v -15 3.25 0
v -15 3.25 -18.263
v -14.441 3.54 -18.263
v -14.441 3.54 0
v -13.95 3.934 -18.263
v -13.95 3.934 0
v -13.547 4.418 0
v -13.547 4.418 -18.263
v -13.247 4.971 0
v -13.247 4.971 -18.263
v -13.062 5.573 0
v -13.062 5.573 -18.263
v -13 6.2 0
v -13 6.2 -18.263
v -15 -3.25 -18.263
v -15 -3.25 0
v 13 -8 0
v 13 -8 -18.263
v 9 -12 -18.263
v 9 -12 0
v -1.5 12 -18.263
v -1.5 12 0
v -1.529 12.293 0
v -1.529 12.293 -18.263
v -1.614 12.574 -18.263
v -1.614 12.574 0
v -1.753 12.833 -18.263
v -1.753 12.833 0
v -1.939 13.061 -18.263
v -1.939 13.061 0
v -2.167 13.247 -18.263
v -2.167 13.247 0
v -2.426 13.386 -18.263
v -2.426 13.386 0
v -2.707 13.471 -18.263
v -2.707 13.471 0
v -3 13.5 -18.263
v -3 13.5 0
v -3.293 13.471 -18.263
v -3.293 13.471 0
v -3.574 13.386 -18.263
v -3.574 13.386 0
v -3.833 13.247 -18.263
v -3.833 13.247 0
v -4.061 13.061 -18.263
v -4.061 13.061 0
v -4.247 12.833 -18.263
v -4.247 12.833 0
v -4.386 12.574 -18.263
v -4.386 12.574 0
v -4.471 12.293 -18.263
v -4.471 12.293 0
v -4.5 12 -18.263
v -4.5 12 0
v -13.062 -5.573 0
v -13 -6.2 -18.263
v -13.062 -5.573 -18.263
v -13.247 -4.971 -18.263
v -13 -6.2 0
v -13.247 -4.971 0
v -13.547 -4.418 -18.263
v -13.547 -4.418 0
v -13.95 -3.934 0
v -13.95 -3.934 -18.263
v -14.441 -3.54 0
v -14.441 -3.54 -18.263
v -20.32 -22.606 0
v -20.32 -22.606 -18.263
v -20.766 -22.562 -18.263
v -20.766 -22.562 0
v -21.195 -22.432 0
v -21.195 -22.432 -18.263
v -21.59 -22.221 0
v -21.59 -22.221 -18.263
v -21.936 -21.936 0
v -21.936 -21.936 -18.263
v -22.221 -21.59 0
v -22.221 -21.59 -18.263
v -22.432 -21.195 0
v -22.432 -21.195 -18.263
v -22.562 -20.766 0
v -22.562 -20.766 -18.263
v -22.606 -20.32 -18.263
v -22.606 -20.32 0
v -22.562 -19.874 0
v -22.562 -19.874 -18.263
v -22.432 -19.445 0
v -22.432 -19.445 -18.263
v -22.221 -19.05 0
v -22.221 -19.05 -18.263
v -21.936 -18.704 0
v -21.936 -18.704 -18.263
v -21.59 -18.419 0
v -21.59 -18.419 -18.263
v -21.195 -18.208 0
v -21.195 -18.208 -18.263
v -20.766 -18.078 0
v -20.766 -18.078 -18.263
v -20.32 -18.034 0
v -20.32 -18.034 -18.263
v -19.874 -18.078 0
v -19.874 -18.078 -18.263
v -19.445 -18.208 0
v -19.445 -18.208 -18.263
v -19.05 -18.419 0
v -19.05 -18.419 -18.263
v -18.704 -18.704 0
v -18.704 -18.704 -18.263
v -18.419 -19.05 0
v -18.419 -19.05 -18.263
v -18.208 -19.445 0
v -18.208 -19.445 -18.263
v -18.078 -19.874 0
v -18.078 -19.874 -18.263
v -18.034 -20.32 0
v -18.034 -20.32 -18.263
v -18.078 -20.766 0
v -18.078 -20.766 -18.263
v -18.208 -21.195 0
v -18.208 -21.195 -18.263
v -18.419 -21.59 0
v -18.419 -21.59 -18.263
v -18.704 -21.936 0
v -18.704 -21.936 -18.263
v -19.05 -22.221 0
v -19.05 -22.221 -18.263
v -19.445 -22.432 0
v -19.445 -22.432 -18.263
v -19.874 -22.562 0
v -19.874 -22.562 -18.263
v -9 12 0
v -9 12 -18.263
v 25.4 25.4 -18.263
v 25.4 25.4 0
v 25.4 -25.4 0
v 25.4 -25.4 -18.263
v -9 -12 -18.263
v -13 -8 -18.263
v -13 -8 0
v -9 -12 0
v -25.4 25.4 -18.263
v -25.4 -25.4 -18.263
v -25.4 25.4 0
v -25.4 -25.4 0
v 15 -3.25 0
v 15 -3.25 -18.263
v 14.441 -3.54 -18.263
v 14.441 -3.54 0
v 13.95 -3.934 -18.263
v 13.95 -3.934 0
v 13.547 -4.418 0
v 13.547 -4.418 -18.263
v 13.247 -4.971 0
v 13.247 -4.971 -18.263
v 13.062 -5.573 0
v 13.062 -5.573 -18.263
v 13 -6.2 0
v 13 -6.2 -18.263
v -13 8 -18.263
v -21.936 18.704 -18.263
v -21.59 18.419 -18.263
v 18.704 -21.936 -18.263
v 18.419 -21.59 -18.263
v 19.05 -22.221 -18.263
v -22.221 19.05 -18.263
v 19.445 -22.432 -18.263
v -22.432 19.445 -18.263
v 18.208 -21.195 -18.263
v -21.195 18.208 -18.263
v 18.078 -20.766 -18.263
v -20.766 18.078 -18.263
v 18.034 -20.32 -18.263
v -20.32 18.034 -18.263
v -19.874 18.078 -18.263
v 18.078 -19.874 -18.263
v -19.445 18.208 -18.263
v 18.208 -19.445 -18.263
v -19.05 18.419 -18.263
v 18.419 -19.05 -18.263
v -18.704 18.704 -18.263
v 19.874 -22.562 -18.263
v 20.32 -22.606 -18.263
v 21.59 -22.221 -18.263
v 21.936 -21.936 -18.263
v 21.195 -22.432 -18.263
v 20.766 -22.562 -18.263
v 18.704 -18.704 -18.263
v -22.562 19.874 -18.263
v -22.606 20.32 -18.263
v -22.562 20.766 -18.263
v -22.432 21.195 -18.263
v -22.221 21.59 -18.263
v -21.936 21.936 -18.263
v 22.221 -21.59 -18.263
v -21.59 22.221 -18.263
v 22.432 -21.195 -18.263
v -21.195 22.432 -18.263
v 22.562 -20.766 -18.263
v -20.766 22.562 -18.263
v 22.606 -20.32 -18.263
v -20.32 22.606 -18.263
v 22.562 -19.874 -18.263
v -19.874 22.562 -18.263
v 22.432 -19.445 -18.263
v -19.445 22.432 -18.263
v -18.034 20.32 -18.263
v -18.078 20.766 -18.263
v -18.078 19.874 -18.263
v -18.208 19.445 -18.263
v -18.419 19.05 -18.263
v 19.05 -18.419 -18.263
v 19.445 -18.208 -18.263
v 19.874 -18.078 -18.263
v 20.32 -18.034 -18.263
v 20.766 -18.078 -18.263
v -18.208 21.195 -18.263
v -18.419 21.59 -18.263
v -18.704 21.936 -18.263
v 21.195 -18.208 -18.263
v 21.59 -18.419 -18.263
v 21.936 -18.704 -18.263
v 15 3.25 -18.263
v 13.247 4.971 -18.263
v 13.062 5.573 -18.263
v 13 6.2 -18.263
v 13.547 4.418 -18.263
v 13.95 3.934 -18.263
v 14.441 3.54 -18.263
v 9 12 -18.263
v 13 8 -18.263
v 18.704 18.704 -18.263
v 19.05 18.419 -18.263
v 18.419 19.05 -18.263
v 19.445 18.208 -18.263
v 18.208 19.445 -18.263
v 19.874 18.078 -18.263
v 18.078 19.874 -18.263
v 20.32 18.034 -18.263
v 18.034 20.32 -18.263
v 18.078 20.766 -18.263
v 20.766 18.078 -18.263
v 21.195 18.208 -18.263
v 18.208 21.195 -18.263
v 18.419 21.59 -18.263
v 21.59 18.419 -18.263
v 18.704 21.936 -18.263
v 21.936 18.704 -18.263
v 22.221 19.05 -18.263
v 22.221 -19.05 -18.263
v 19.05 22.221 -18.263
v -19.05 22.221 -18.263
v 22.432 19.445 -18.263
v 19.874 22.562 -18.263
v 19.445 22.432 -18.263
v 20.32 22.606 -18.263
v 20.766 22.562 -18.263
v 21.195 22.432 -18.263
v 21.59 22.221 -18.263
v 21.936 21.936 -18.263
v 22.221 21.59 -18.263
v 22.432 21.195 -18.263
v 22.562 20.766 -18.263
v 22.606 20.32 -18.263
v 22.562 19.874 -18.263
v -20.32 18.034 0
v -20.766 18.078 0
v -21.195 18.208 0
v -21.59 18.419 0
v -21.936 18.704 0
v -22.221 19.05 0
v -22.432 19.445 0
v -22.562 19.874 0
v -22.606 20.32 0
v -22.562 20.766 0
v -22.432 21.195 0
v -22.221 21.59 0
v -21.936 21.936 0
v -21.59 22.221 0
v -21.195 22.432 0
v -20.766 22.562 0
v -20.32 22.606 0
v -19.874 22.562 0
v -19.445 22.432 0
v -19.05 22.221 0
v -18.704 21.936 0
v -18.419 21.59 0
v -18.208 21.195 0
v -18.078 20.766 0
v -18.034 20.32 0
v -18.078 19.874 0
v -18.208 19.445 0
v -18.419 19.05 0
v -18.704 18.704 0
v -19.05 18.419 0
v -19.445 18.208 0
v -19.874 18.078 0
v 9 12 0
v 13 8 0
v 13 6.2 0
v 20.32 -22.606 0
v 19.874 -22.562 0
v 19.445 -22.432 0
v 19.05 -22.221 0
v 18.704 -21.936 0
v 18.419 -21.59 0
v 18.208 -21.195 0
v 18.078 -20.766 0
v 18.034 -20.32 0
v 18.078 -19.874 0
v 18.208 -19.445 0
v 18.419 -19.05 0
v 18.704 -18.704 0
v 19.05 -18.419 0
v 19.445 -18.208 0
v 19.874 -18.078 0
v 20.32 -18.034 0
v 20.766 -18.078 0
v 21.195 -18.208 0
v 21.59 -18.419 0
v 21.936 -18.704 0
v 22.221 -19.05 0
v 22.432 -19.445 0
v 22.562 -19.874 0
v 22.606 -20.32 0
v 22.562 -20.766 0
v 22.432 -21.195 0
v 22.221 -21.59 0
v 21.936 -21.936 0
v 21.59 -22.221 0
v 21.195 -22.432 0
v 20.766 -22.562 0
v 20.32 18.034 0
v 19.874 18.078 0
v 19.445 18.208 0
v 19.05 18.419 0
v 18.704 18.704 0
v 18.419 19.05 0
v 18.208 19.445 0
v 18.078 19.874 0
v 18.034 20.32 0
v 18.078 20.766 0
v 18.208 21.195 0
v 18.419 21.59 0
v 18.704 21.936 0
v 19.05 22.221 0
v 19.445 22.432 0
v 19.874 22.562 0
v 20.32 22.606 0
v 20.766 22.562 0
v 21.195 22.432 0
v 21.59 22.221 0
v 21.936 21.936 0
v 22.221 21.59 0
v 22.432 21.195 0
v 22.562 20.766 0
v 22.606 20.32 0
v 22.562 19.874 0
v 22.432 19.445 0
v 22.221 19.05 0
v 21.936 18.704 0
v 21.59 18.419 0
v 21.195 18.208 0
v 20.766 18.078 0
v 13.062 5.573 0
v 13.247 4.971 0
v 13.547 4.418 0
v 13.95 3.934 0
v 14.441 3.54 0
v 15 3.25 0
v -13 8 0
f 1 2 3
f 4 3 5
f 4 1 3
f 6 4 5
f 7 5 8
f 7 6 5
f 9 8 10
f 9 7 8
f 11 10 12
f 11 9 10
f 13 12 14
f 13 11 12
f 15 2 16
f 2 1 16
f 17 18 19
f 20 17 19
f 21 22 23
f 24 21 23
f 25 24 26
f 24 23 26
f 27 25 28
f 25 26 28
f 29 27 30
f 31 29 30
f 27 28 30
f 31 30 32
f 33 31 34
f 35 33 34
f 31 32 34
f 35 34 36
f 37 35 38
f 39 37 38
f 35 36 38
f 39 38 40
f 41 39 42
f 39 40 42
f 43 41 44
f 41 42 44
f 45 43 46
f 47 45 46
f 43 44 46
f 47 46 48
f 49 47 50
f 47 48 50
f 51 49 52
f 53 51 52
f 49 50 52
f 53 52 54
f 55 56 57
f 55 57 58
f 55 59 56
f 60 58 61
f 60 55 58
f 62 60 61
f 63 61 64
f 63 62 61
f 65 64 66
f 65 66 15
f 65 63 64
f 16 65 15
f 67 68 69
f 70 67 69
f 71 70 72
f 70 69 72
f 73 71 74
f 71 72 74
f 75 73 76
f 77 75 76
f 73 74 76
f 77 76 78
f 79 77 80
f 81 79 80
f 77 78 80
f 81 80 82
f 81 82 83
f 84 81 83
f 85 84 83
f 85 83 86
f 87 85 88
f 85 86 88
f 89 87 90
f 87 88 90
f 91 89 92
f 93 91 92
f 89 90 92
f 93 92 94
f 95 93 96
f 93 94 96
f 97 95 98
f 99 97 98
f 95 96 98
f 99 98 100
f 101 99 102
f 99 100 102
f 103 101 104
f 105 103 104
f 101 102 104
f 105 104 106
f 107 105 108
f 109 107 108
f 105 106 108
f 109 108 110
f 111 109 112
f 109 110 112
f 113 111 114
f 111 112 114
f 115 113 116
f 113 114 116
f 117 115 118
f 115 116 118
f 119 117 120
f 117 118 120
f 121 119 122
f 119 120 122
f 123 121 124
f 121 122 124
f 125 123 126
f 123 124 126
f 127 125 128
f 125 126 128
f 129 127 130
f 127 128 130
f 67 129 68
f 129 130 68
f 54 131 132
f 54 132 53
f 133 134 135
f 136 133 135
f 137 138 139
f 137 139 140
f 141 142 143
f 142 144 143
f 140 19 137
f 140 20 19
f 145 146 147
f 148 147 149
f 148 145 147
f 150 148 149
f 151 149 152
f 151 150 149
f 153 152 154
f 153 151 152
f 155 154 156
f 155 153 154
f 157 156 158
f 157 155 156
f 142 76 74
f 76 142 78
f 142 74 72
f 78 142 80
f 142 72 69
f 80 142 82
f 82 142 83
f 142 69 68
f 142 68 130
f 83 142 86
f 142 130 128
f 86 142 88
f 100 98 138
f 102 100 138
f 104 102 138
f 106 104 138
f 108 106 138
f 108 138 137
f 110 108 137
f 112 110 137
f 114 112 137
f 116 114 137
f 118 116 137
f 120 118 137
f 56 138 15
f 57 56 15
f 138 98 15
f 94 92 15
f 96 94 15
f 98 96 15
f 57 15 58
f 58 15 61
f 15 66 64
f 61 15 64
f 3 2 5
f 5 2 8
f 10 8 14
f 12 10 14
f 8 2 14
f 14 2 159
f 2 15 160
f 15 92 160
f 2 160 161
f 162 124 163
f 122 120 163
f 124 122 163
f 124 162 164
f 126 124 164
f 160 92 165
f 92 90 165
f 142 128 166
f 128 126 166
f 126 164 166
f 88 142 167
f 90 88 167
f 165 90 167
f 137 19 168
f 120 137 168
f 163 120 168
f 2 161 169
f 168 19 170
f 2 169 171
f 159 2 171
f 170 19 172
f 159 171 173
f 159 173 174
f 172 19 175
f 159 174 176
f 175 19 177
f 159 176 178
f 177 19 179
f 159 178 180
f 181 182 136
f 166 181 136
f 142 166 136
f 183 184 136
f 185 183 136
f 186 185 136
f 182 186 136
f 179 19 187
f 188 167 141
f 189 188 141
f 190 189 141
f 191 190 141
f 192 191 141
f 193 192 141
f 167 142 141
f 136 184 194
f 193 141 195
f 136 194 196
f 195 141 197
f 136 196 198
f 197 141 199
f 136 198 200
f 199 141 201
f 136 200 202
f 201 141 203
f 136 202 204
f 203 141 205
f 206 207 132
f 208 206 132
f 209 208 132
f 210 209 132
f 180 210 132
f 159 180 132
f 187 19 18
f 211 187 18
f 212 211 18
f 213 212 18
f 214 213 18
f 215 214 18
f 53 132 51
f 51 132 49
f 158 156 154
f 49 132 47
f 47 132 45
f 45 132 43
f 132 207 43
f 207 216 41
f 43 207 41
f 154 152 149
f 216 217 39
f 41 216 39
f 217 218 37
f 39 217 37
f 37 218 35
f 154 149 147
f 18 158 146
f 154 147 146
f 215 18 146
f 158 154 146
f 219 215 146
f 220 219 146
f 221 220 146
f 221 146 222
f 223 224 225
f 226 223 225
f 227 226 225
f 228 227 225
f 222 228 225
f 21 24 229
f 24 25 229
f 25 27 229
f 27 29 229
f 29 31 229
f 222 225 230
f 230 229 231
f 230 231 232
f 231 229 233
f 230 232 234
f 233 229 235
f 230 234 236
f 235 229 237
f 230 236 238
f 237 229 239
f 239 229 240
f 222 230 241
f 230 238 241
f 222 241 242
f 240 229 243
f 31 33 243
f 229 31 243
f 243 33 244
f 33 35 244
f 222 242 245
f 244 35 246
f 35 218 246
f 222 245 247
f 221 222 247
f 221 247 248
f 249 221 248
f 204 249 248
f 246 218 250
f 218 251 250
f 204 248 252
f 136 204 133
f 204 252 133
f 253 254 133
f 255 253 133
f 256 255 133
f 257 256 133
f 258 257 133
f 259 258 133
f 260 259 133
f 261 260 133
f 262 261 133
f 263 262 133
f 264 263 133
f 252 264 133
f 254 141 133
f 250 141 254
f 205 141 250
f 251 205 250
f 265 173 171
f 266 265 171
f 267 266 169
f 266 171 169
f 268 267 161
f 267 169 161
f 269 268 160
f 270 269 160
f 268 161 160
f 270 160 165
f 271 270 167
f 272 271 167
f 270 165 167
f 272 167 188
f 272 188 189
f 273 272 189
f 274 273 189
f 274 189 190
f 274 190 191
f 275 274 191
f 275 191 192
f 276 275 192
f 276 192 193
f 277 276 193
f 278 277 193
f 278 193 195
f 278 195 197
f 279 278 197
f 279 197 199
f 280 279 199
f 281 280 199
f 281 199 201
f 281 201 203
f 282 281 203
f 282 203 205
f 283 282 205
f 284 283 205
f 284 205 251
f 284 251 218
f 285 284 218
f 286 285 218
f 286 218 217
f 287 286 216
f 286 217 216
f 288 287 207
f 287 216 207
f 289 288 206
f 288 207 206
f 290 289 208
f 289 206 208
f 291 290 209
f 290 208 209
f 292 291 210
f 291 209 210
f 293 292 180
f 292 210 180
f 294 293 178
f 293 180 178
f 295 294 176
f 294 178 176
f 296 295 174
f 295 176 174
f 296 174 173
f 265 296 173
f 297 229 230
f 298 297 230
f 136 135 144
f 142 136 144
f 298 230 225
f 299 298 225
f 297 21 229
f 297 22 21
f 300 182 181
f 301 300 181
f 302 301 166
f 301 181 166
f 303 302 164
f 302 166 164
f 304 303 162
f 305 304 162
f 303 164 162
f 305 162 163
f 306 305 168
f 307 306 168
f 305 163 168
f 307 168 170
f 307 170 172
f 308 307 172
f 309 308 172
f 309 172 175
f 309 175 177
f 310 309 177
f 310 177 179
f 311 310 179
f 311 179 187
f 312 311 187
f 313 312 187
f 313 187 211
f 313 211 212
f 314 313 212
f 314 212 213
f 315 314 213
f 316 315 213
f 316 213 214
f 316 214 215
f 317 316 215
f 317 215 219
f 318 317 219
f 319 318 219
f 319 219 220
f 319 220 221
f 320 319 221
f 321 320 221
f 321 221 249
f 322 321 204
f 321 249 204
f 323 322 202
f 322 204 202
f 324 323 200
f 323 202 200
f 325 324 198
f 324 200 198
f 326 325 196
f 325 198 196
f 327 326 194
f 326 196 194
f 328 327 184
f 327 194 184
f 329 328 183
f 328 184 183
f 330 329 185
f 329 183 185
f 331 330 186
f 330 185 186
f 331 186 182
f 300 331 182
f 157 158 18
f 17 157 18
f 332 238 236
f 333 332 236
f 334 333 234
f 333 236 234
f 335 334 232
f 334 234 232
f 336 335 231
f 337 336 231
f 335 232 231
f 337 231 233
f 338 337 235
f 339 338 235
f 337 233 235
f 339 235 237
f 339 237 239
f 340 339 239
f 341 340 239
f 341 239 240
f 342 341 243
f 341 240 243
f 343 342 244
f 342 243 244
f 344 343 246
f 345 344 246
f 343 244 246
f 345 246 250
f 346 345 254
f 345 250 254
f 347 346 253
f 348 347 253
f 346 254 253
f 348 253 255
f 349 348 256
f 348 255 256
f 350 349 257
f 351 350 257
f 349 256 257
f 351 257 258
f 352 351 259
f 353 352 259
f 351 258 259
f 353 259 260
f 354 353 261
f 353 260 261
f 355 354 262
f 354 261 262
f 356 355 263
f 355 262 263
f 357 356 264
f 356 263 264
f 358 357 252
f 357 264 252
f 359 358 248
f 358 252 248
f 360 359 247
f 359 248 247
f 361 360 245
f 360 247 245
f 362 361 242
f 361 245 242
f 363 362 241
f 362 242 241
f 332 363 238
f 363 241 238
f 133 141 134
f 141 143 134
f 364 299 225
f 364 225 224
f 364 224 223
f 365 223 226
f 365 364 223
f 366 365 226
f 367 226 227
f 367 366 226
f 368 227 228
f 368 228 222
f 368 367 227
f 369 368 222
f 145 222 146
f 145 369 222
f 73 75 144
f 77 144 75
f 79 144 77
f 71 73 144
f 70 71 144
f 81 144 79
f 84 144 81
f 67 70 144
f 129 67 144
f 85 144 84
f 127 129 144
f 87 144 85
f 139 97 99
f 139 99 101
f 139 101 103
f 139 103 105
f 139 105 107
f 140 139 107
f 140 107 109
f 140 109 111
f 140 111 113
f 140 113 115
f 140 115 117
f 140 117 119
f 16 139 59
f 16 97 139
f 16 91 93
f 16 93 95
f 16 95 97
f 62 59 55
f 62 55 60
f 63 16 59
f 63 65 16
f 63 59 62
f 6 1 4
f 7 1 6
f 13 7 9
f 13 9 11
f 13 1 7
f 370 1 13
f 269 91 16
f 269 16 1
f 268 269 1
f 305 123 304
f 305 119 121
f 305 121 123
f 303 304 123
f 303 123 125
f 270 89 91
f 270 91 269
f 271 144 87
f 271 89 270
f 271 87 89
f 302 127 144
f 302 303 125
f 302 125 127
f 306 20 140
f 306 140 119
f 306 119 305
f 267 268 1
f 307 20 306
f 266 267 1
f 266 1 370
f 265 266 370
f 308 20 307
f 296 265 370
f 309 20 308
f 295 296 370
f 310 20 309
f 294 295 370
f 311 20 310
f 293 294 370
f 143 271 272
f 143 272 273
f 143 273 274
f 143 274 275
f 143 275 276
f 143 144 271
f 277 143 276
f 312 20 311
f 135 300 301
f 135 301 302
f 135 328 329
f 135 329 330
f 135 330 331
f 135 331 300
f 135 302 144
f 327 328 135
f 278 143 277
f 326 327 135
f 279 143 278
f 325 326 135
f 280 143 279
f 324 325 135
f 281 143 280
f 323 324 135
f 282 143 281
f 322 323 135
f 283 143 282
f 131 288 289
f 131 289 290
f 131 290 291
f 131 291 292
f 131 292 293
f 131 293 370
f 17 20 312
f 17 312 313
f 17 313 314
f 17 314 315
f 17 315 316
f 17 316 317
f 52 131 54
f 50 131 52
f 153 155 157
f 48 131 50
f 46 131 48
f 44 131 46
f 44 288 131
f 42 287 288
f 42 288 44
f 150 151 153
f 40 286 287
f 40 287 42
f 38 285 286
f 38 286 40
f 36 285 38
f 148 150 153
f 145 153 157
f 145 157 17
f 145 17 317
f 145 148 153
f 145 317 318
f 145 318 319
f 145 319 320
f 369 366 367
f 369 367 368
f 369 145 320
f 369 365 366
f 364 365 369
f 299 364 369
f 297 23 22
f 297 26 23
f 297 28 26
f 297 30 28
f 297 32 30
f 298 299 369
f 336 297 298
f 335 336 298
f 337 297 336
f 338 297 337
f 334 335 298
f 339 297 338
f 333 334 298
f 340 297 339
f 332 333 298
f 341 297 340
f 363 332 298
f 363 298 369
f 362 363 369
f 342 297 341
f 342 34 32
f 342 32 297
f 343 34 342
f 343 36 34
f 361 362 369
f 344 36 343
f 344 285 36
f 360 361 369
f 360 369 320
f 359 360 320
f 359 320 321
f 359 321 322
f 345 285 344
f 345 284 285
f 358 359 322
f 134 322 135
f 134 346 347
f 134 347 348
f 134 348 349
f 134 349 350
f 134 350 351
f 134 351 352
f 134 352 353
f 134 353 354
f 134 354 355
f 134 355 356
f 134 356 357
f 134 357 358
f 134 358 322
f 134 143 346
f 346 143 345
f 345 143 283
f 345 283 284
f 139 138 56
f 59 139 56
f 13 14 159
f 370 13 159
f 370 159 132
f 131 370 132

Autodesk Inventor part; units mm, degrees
ref_plane "YZ Plane" through (0, 0, 0) normal (1, 0, 0) x (0, 1, 0)
ref_plane "XZ Plane" through (0, 0, 0) normal (0, 1, 0) x (-1, 0, 0)
ref_plane "XY Plane" through (0, 0, 0) normal (0, 0, 1) x (1, 0, 0)
sketch "Sketch1" plane through (0, 0, 0) normal (0, 0, 1) x (1, 0, 0)
  line L0 (-13, 12) -> (13, 12)
  line L1 (13, 12) -> (13, -12)
  line L2 (13, -12) -> (-13, -12)
  line L3 (-13, -12) -> (-13, 12)
  line L4 (-13, 3.25) -> (-15, 3.25)
  line L5 (-15, 3.25) -> (-15, -3.25)
  line L6 (-15, -3.25) -> (-13, -3.25)
  line L7 (-13, -3.25) -> (-13, 3.25)
  line L8 (13, 3.25) -> (15, 3.25)
  line L9 (15, 3.25) -> (15, -3.25)
  line L10 (15, -3.25) -> (13, -3.25)
  line L11 (13, -3.25) -> (13, 3.25)
  line L12 (-25.4, 25.4) -> (25.4, 25.4)
  line L13 (25.4, 25.4) -> (25.4, -25.4)
  line L14 (25.4, -25.4) -> (-25.4, -25.4)
  line L15 (-25.4, -25.4) -> (-25.4, 25.4)
  circle A0 centre (0, 0) radius 7.1437
  circle A1 centre (-3, 12) radius 1.5
  line L16 (-13, 8) -> (-9, 12)
  line L17 (9, 12) -> (13, 8)
  line L18 (13, -8) -> (9, -12)
  line L19 (-13, -8) -> (-9, -12)
  point P0 (-14, 3.25)
  point P1 (14, 3.25)
  point P2 (-14, -3.25)
  point P3 (14, -3.25)
  point P4 (-20.32, 20.32)
  point P5 (20.32, 20.32)
  point P6 (20.32, -20.32)
  point P7 (-20.32, -20.32)
  dimension "d0" = 24
  dimension "d1" = 12
  dimension "d2" = 26
  dimension "d3" = 13
  dimension "d4" = 2
  dimension "d5" = 6.5
  dimension "d6" = 3.25
  dimension "d7" = 2
  dimension "d8" = 14.2875
  dimension "d9" = 50.8
  dimension "d10" = 25.4
  dimension "d11" = 50.8
  dimension "d12" = 25.4
  dimension "d13" = 3
  dimension "d14" = 10
  dimension "d15" = 4
  dimension "d16" = 4
  dimension "d17" = 4
  dimension "d18" = 4
  dimension "d19" = 4
  dimension "d20" = 5.08
  dimension "d21" = 5.08
  dimension "d22" = 5.08
  dimension "d23" = 5.08
  dimension "d34" = 40.64
  dimension "d35" = 40.64
extrude "Extrusion1" add sketch "Sketch1" against normal blind 18.2626 contours L0 L16 L3 | L0 L1 L17 | L19 L2 L3 | L18 L1 L2 | L12 L13 L14 L15
fillet "Fillet1" radius 3.175 4 edges at (-13, -3.25, -9.1313) (-13, 3.25, -9.1313) (13, 3.25, -9.1313) (13, -3.25, -9.1313)
hole "Hole1" at (-20.32, 20.32, 0) at (20.32, 20.32, 0) at (20.32, -20.32, 0) at (-20.32, -20.32, 0) direction (0, 0, -1) diameter 4.572 end through all
thread "Thread1" size "10-32 UNF" class "2B" standard "ANSI Unified Screw Threads" full length
thread "Thread2" size "10-32 UNF" class "2B" standard "ANSI Unified Screw Threads" full length
thread "Thread3" size "10-32 UNF" class "2B" standard "ANSI Unified Screw Threads" full length
thread "Thread4" size "10-32 UNF" class "2B" standard "ANSI Unified Screw Threads" full length
equation "\"d1\" = 0.5 * d0"
equation "\"d3\" = 0.5 * d2"
equation "\"d6\" = 0.5 * d5"
equation "\"d7\" = d4"
equation "\"d10\" = 0.5 * d9"
equation "\"d12\" = 0.5 * d11"
equation "\"d16\" = d15"
equation "\"d17\" = d15"
equation "\"d18\" = d15"
equation "\"d19\" = d15"
equation "\"d22\" = d21"
equation "\"d23\" = d21"
properties part number "BD gearbox mount block"
